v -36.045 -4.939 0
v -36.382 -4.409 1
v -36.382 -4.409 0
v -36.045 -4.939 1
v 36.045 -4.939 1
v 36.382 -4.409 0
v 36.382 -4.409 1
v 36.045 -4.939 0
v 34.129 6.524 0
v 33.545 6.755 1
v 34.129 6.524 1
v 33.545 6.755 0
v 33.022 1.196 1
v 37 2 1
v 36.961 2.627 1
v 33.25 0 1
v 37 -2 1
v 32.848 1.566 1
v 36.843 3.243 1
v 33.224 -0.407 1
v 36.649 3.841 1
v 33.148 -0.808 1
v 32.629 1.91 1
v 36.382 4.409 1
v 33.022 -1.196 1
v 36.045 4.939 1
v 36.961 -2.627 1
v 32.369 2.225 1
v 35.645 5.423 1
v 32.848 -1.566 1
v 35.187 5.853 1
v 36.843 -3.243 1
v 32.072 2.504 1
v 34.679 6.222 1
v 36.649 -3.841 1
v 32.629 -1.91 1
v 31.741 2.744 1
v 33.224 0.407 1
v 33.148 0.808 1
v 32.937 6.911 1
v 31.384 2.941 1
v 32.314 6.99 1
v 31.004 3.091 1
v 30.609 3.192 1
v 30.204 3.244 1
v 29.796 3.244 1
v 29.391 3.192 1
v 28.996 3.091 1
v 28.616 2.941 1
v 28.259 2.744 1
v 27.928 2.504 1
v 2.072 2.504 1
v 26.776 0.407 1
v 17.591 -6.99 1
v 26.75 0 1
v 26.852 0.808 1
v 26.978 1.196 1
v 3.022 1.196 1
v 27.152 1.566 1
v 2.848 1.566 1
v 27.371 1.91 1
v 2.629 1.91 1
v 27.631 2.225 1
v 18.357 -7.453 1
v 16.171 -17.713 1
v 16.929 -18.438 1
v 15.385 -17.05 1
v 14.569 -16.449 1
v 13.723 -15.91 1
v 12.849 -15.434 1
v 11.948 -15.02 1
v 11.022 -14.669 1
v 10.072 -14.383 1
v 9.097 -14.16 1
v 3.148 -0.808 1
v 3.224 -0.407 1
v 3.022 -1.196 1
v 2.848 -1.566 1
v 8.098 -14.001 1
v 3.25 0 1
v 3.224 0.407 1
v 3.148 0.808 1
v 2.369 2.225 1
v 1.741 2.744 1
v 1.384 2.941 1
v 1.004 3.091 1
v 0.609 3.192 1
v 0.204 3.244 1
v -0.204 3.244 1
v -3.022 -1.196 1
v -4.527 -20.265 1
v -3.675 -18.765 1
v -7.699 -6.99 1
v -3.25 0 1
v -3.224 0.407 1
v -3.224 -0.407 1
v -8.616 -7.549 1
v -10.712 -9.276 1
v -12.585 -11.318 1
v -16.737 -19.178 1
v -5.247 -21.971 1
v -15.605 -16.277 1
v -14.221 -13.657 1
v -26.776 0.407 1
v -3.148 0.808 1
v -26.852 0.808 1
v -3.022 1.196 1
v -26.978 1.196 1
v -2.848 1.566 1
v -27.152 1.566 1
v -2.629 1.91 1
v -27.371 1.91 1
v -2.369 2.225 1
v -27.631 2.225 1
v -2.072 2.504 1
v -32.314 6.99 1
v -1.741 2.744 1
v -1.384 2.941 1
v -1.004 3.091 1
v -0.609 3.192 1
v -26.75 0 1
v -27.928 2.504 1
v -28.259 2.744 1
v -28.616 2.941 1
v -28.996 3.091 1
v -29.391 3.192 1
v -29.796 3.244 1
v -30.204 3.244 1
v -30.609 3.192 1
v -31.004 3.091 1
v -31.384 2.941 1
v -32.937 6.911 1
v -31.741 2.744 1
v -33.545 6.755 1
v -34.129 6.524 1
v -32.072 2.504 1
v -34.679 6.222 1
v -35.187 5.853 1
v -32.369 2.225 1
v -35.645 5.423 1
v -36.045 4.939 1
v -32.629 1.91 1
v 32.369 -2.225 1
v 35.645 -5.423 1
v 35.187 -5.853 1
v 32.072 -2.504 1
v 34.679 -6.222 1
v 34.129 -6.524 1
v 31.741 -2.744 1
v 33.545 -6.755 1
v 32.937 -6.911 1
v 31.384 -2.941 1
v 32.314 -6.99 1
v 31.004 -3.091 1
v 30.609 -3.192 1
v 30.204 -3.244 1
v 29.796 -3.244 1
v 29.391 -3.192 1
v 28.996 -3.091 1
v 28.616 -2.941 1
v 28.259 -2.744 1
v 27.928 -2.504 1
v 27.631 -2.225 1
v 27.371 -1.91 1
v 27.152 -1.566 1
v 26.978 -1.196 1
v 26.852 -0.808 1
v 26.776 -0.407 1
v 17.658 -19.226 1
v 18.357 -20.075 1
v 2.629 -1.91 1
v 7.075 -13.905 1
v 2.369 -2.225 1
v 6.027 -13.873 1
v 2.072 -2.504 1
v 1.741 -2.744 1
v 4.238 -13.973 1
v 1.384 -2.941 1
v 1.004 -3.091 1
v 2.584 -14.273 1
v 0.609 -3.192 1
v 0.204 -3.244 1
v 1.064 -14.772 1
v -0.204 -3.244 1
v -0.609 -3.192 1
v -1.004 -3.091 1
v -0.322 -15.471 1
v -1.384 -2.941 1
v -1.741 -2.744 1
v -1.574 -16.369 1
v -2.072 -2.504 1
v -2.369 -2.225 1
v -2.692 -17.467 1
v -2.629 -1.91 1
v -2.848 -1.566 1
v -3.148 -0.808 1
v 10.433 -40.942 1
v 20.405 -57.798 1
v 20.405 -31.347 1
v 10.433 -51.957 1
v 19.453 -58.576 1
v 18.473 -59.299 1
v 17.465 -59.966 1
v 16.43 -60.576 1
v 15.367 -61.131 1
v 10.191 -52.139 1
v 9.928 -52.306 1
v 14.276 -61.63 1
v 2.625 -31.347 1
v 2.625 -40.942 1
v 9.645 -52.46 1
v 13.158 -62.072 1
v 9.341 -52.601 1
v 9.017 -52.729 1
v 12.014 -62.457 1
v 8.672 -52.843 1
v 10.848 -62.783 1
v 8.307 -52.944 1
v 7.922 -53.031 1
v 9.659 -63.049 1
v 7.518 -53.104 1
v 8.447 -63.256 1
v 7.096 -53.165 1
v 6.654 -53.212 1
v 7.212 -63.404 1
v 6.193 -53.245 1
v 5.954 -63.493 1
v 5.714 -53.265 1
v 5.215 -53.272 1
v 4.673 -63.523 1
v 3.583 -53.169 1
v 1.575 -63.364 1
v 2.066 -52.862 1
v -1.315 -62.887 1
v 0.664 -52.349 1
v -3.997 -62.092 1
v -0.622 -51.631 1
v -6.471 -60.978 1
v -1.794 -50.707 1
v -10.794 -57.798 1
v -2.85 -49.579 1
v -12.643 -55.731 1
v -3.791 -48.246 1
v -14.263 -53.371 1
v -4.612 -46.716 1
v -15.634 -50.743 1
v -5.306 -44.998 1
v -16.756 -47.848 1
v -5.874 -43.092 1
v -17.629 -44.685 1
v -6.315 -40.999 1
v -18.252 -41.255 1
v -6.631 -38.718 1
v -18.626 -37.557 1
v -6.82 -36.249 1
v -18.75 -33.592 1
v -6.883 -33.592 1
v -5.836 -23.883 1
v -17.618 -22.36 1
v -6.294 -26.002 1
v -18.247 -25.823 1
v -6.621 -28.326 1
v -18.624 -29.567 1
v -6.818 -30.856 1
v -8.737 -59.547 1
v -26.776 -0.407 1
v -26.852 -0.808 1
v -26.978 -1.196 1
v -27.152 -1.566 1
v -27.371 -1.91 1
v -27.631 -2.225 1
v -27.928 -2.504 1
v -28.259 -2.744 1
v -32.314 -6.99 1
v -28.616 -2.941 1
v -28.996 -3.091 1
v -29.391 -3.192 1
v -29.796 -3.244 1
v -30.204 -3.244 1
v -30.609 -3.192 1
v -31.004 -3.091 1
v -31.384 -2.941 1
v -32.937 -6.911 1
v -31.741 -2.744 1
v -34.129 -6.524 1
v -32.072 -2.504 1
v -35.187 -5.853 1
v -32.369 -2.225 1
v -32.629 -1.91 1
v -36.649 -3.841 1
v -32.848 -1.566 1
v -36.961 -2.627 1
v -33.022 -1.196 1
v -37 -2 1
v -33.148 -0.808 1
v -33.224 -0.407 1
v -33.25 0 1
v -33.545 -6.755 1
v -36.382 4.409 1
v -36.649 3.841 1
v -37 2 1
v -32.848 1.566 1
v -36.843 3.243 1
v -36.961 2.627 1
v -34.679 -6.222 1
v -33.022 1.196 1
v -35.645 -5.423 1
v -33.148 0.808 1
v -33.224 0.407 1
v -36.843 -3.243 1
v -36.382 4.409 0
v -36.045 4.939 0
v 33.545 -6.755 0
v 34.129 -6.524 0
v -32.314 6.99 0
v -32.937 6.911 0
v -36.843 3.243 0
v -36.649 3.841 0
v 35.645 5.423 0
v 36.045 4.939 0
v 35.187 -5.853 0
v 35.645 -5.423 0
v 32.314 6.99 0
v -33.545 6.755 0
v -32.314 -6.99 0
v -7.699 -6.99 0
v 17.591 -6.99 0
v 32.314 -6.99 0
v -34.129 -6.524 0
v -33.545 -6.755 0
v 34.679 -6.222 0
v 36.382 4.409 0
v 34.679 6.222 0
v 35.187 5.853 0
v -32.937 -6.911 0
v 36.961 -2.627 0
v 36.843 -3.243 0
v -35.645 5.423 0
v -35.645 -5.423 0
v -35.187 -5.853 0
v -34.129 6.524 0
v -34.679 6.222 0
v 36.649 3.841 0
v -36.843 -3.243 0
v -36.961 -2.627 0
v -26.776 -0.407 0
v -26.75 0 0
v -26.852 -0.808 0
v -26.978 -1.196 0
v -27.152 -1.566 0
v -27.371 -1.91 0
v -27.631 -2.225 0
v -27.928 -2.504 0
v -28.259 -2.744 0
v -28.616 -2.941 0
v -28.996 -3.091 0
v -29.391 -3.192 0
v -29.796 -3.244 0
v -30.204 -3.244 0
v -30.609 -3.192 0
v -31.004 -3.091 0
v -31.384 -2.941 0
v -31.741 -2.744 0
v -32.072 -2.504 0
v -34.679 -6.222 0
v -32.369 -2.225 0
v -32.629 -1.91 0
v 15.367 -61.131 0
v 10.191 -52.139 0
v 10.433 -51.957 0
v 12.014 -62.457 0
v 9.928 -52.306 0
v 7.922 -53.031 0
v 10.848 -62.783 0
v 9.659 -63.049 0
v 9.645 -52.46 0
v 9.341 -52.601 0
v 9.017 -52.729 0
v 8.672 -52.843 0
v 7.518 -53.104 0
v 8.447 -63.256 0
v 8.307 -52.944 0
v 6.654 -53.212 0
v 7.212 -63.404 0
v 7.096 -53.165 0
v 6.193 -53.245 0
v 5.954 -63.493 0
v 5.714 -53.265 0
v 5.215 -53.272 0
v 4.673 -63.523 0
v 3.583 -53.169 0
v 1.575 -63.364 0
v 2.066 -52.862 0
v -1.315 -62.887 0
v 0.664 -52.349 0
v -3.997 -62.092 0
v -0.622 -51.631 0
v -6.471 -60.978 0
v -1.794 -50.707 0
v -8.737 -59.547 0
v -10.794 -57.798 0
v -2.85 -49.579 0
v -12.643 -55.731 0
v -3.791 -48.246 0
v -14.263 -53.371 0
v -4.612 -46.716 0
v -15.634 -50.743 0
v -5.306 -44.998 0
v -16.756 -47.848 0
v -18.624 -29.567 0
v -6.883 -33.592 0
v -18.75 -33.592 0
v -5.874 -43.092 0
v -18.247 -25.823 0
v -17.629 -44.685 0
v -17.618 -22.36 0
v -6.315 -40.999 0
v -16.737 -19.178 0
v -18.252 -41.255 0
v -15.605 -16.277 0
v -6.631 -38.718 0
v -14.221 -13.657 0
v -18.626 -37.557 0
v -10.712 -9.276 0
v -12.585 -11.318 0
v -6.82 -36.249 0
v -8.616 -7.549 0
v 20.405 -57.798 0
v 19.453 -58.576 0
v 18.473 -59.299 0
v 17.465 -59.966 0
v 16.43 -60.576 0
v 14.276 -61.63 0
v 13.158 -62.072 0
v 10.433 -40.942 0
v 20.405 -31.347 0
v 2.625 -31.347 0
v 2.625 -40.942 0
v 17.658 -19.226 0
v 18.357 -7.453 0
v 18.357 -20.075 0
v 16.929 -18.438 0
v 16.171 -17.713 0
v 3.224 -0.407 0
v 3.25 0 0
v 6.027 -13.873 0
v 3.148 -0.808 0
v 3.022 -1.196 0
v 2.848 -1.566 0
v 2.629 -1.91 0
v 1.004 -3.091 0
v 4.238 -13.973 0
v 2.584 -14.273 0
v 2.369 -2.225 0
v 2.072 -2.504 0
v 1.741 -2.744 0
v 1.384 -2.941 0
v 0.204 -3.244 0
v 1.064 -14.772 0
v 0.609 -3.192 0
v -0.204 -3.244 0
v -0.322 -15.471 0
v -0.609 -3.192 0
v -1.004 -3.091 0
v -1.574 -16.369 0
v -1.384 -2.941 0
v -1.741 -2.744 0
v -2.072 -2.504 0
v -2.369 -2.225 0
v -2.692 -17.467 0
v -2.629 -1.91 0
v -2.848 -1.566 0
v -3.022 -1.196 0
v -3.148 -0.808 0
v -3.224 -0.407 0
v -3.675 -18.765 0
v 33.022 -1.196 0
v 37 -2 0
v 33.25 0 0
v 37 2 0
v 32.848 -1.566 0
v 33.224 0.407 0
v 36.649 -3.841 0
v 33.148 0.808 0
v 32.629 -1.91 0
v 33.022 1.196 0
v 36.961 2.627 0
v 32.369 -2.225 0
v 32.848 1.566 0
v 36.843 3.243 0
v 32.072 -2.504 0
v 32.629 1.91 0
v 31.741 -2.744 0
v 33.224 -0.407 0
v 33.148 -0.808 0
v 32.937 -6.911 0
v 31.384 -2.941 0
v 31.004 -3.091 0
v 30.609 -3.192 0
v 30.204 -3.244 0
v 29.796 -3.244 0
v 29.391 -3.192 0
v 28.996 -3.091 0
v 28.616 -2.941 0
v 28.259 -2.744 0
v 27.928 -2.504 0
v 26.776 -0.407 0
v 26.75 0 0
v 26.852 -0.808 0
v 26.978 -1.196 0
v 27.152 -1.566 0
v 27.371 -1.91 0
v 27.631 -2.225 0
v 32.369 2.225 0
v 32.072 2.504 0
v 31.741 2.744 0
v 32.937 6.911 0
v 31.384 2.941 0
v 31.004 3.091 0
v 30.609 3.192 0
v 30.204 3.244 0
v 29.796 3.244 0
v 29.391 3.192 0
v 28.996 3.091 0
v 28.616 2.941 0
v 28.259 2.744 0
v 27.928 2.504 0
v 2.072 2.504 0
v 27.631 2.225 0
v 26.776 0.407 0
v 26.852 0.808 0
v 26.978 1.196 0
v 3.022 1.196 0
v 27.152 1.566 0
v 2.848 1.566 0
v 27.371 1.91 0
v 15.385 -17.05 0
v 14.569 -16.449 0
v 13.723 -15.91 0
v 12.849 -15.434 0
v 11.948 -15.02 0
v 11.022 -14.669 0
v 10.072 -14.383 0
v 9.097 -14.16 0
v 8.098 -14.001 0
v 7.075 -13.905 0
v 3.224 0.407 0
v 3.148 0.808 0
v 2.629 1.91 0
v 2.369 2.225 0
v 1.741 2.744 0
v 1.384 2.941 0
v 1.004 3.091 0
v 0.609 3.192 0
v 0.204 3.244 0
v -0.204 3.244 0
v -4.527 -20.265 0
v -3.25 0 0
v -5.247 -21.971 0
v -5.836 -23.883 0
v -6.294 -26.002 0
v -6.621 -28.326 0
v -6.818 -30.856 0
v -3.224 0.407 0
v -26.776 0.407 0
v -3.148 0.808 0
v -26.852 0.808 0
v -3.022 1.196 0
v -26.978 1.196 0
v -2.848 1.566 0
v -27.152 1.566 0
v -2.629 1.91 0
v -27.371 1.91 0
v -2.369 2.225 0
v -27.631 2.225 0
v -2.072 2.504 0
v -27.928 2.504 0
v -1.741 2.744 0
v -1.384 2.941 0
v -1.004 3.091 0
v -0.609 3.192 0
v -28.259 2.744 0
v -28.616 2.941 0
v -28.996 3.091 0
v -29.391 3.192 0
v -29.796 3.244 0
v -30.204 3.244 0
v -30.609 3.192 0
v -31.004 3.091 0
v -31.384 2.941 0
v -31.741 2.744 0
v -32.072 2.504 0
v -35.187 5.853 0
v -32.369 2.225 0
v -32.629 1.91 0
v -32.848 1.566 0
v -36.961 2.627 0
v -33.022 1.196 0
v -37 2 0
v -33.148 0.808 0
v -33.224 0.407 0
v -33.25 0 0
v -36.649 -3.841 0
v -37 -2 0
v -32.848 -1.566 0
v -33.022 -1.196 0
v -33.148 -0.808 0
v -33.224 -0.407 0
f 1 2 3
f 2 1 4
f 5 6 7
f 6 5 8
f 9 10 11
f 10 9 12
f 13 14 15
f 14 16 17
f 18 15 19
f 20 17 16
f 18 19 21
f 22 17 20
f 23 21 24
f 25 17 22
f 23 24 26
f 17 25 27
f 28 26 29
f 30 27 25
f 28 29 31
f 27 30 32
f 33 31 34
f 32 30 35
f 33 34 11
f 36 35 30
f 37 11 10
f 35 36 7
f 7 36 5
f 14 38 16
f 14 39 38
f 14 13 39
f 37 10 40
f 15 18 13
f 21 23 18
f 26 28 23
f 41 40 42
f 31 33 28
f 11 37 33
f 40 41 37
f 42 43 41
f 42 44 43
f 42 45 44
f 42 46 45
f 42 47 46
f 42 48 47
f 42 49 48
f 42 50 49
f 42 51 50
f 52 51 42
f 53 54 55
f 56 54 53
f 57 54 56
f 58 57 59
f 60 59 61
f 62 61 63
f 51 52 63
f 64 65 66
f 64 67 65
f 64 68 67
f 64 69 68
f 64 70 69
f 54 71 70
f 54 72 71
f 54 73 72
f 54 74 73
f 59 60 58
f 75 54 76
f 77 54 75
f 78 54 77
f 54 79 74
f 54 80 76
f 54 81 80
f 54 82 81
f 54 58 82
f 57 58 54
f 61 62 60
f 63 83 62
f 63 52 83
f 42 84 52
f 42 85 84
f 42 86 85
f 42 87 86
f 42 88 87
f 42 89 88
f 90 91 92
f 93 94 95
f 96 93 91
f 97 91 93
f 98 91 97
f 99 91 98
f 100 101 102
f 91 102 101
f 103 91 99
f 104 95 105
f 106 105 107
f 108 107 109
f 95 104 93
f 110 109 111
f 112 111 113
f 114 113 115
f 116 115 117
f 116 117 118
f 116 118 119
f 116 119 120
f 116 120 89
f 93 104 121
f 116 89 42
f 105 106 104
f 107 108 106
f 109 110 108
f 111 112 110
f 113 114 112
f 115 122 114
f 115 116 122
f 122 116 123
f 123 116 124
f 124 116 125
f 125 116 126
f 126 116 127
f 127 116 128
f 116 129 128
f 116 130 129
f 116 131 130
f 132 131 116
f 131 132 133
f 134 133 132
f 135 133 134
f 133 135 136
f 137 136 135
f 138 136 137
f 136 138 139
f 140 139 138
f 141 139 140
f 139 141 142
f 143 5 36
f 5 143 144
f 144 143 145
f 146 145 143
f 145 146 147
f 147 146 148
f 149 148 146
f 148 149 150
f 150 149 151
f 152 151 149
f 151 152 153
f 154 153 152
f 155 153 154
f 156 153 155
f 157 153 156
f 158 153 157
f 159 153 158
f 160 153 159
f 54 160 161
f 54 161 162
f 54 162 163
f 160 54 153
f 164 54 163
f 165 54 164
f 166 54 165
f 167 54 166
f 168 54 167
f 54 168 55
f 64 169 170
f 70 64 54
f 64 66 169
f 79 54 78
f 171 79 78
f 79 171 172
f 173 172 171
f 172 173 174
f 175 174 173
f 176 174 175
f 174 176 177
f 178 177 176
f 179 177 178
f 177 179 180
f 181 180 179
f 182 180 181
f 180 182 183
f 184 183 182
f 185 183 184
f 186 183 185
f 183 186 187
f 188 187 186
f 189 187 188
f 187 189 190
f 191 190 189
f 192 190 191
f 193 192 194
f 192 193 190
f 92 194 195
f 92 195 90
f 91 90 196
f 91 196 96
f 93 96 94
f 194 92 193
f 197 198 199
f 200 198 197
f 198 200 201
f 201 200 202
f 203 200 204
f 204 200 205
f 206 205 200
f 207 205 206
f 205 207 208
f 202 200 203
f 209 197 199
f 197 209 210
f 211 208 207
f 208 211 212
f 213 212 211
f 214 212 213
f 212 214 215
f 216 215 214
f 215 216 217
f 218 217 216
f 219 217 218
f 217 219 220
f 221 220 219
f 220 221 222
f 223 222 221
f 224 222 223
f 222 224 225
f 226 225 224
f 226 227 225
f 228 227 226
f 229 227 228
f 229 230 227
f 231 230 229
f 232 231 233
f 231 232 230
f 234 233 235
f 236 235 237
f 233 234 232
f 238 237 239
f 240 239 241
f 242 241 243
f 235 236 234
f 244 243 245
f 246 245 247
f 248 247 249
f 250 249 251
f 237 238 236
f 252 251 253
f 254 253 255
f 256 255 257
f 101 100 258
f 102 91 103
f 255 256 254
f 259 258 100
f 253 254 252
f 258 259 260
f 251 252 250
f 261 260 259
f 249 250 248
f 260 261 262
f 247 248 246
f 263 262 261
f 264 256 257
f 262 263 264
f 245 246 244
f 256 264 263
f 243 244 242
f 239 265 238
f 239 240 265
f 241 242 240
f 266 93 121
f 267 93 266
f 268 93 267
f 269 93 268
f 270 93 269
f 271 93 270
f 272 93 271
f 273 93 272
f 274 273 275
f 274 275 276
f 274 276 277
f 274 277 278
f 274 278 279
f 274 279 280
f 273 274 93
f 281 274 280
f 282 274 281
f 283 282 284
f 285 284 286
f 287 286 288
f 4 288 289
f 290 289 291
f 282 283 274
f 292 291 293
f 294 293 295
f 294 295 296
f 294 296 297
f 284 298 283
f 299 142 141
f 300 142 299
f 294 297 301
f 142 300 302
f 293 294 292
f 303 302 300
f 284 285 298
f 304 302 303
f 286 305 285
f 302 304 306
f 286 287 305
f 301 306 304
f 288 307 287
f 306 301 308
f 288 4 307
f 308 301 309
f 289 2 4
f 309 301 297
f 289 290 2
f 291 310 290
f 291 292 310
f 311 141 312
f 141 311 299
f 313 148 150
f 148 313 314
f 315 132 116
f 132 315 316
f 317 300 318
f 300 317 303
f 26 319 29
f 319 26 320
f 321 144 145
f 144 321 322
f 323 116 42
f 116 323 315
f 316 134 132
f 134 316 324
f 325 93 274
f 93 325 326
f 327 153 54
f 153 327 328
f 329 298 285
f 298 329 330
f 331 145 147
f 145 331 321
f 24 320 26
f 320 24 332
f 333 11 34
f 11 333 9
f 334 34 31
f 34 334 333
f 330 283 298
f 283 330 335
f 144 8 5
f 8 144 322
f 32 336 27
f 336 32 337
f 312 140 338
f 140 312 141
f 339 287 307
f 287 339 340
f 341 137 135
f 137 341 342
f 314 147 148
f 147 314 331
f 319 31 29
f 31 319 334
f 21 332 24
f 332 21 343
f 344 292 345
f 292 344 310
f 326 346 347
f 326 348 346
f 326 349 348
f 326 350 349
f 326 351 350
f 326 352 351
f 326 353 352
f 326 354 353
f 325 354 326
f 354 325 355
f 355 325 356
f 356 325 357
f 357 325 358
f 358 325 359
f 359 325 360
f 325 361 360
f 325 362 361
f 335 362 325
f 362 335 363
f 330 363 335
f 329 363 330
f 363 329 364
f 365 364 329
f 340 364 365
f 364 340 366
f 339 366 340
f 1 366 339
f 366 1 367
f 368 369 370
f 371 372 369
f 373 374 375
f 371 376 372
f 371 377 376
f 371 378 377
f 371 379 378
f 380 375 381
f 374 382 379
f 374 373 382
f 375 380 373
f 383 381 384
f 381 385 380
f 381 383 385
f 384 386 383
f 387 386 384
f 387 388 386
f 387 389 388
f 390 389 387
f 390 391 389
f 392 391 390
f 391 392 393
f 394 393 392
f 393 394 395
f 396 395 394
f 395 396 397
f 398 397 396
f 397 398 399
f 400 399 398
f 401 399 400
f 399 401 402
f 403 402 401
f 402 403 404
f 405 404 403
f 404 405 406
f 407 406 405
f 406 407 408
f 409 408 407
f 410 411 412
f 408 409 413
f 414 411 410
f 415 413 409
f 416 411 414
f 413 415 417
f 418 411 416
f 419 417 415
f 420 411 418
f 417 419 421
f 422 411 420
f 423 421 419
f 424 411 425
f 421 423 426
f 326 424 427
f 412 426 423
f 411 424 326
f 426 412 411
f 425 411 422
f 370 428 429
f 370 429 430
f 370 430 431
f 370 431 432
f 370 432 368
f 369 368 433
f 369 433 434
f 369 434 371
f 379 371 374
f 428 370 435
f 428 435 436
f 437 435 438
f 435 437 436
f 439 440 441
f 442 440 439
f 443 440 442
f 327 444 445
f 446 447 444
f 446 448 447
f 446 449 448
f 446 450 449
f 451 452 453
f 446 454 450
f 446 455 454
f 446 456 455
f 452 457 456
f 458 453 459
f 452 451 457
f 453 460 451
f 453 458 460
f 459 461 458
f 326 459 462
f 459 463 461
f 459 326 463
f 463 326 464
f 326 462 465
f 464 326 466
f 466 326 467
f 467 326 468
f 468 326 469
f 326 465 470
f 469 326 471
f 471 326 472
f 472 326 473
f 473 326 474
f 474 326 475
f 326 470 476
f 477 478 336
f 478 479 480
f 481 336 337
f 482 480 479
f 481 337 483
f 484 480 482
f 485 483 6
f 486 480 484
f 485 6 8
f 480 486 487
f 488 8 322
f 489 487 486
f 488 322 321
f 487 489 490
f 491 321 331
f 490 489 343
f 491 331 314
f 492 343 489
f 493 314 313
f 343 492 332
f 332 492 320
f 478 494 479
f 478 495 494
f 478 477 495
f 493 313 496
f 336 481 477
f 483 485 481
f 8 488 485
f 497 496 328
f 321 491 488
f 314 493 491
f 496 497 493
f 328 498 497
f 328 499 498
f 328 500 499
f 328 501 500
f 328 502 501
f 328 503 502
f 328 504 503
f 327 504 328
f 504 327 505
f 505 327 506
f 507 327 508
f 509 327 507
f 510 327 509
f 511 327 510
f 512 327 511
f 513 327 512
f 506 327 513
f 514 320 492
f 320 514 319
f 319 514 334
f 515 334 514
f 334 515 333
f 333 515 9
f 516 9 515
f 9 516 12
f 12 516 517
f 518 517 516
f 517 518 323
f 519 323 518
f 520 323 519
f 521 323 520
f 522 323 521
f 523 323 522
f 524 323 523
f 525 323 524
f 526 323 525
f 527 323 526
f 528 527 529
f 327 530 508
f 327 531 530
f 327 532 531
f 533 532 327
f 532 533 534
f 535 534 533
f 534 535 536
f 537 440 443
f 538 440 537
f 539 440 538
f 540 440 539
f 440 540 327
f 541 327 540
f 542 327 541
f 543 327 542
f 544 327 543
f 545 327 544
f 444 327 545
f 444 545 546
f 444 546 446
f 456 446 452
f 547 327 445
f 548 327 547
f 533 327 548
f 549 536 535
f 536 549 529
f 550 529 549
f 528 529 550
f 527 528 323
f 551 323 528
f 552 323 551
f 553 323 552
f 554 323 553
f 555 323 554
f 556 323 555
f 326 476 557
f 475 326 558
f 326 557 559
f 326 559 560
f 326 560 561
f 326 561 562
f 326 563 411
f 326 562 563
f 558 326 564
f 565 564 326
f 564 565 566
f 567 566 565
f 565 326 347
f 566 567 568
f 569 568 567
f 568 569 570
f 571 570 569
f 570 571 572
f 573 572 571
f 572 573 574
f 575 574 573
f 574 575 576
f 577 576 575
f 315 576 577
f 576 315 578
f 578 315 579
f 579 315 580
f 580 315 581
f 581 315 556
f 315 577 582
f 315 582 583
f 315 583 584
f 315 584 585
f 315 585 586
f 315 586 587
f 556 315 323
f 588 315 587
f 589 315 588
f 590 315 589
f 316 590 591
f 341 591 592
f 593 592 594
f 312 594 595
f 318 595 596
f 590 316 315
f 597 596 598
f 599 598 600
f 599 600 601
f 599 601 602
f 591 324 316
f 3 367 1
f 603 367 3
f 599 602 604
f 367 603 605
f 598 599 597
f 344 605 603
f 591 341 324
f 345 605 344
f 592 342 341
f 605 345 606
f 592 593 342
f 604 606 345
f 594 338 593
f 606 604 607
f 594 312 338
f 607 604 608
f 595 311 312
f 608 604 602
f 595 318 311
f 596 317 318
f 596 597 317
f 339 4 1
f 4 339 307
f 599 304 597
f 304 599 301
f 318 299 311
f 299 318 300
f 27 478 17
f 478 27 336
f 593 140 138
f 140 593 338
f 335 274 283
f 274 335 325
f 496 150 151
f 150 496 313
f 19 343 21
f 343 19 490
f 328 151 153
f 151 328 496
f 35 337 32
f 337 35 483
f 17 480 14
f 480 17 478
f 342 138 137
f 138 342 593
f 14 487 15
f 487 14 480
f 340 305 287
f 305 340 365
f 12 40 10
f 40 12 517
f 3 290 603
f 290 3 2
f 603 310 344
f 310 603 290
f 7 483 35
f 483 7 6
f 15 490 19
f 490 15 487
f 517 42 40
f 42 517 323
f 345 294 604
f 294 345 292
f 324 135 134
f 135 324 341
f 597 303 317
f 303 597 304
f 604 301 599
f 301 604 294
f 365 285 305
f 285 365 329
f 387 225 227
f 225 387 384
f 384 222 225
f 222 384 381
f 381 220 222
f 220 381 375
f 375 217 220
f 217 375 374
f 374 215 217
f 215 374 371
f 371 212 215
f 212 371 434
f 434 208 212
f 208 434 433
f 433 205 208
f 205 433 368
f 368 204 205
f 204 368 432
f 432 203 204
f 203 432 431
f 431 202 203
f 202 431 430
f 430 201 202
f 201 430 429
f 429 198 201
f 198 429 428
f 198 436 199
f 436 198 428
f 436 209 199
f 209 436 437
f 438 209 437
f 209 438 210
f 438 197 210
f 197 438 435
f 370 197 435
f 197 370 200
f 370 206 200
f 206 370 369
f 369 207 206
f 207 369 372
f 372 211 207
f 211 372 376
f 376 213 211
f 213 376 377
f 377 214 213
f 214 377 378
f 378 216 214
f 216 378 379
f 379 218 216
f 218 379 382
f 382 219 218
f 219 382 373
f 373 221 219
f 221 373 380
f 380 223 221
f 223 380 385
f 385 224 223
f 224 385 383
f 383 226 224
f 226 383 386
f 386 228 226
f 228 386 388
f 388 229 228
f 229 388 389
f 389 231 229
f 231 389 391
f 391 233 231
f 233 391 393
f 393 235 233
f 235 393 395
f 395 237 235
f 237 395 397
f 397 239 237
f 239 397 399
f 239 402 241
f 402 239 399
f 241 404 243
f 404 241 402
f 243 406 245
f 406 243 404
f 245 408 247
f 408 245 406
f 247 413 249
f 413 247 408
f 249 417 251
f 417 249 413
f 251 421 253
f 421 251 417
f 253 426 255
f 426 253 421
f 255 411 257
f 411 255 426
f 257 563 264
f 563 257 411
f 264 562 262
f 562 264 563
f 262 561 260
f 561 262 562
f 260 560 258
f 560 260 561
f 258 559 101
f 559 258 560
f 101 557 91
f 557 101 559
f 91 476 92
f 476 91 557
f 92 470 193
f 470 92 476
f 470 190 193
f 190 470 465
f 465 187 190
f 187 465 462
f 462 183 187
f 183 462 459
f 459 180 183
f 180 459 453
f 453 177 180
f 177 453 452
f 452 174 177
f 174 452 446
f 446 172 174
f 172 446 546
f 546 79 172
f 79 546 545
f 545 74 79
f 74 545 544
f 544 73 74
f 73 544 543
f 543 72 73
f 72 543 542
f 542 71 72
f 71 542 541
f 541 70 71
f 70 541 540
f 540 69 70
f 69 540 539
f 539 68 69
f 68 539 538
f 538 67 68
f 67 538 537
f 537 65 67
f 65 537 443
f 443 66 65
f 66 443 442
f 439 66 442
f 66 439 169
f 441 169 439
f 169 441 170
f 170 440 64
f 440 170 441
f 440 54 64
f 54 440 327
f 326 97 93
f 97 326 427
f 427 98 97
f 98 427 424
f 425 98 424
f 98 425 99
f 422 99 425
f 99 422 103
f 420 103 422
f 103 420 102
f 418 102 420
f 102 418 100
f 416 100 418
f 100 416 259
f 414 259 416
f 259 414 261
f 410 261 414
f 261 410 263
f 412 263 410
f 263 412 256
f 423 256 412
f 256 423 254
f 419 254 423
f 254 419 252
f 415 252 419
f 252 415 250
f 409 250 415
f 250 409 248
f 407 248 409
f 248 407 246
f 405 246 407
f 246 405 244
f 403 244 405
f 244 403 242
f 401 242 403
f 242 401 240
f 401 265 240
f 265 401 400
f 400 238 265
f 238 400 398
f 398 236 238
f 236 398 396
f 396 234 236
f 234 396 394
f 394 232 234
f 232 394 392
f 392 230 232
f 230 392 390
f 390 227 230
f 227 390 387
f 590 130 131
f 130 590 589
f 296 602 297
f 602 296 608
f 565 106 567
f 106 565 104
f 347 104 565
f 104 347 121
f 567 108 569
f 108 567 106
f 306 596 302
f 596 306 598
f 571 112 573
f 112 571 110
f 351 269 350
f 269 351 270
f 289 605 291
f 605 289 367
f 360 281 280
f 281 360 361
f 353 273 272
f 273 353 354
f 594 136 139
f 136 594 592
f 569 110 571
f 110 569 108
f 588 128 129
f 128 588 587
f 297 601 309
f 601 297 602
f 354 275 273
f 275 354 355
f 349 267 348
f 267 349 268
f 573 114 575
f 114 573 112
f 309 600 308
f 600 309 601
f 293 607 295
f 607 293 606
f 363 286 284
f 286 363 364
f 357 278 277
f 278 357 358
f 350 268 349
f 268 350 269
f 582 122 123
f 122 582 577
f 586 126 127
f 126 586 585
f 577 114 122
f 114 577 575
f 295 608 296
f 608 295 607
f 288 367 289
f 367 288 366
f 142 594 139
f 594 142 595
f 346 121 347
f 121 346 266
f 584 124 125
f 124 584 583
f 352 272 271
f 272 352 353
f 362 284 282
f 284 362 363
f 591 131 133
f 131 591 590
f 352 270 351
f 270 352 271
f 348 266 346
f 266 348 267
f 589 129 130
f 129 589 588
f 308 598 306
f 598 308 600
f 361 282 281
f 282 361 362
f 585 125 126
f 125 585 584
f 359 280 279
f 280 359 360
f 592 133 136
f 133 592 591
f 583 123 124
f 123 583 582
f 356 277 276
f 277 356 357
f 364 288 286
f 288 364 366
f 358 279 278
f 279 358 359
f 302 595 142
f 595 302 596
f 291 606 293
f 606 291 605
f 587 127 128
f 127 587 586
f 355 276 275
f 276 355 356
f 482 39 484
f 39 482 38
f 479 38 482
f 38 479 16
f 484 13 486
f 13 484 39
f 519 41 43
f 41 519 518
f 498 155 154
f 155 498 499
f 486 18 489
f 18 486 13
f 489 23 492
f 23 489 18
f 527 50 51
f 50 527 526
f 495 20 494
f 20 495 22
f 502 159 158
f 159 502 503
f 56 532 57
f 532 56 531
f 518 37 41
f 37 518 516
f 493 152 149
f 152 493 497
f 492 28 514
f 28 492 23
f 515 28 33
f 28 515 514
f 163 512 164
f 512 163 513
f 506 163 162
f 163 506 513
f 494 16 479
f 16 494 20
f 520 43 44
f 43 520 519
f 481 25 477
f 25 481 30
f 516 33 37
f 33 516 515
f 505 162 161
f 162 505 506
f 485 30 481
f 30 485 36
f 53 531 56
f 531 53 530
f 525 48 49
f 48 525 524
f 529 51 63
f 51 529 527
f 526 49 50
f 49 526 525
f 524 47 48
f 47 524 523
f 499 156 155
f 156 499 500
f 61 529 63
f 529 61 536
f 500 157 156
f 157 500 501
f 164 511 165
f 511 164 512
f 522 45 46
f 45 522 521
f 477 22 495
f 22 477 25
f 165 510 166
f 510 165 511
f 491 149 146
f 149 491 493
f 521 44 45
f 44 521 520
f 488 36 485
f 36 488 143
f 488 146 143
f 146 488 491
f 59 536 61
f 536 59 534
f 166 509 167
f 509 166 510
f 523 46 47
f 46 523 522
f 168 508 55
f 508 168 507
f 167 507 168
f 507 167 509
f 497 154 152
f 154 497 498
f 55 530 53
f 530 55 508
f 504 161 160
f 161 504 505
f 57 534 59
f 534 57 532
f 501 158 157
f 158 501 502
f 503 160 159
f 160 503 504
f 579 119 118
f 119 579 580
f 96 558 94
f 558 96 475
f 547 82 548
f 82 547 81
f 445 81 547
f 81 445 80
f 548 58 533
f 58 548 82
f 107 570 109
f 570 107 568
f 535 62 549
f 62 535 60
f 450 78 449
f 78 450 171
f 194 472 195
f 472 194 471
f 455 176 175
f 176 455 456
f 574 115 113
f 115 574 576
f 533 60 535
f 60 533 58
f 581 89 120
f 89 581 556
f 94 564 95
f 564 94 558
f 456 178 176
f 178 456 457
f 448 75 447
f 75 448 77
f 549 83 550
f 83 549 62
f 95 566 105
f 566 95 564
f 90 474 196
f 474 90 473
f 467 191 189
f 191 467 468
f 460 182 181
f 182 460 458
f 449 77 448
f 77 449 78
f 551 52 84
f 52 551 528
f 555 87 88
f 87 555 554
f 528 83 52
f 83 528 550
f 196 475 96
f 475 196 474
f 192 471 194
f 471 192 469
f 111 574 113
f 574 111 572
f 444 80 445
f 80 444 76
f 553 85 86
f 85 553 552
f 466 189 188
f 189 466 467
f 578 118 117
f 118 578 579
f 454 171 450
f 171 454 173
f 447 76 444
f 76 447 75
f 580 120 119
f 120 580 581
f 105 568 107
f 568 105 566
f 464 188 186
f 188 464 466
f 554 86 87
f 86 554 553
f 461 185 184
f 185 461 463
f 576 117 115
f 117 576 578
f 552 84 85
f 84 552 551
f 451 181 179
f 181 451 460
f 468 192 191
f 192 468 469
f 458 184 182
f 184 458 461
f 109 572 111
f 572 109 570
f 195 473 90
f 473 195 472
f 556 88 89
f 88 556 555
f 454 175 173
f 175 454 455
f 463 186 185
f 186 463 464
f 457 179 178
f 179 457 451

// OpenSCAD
$fn = 50;


difference() {
	union() {
		translate(v = [0, 0, 0]) {
			rotate(a = [0, 0, 0]) {
				hull() {
					translate(v = [-32.0000000000, 2.0000000000, 0]) {
						rotate(a = [0, 0, 0]) {
							translate(v = [0, 0, 0]) {
								rotate(a = [0, 0, 0]) {
									cylinder(h = 1, r = 5);
								}
							}
						}
					}
					translate(v = [32.0000000000, 2.0000000000, 0]) {
						rotate(a = [0, 0, 0]) {
							translate(v = [0, 0, 0]) {
								rotate(a = [0, 0, 0]) {
									cylinder(h = 1, r = 5);
								}
							}
						}
					}
					translate(v = [-32.0000000000, -2.0000000000, 0]) {
						rotate(a = [0, 0, 0]) {
							translate(v = [0, 0, 0]) {
								rotate(a = [0, 0, 0]) {
									cylinder(h = 1, r = 5);
								}
							}
						}
					}
					translate(v = [32.0000000000, -2.0000000000, 0]) {
						rotate(a = [0, 0, 0]) {
							translate(v = [0, 0, 0]) {
								rotate(a = [0, 0, 0]) {
									cylinder(h = 1, r = 5);
								}
							}
						}
					}
				}
			}
		}
		translate(v = [0, -5, 0]) {
			rotate(a = [0, 0, 0]) {
				linear_extrude(height = 1) {
					text(font = "DejaVu Sans Mono:style=Bold", halign = "center", size = 57.0000000000, text = "G", valign = "top");
				}
			}
		}
	}
	union() {
		translate(v = [-30.0000000000, 0.0000000000, -125.0000000000]) {
			rotate(a = [0, 0, 0]) {
				cylinder(h = 250, r = 3.2500000000);
			}
		}
		translate(v = [30.0000000000, 0.0000000000, -125.0000000000]) {
			rotate(a = [0, 0, 0]) {
				cylinder(h = 250, r = 3.2500000000);
			}
		}
		translate(v = [30.0000000000, 0.0000000000, -125.0000000000]) {
			rotate(a = [0, 0, 0]) {
				cylinder(h = 250, r = 3.2500000000);
			}
		}
		translate(v = [0, 0, -125.0000000000]) {
			rotate(a = [0, 0, 0]) {
				cylinder(h = 250, r = 3.2500000000);
			}
		}
	}
}
